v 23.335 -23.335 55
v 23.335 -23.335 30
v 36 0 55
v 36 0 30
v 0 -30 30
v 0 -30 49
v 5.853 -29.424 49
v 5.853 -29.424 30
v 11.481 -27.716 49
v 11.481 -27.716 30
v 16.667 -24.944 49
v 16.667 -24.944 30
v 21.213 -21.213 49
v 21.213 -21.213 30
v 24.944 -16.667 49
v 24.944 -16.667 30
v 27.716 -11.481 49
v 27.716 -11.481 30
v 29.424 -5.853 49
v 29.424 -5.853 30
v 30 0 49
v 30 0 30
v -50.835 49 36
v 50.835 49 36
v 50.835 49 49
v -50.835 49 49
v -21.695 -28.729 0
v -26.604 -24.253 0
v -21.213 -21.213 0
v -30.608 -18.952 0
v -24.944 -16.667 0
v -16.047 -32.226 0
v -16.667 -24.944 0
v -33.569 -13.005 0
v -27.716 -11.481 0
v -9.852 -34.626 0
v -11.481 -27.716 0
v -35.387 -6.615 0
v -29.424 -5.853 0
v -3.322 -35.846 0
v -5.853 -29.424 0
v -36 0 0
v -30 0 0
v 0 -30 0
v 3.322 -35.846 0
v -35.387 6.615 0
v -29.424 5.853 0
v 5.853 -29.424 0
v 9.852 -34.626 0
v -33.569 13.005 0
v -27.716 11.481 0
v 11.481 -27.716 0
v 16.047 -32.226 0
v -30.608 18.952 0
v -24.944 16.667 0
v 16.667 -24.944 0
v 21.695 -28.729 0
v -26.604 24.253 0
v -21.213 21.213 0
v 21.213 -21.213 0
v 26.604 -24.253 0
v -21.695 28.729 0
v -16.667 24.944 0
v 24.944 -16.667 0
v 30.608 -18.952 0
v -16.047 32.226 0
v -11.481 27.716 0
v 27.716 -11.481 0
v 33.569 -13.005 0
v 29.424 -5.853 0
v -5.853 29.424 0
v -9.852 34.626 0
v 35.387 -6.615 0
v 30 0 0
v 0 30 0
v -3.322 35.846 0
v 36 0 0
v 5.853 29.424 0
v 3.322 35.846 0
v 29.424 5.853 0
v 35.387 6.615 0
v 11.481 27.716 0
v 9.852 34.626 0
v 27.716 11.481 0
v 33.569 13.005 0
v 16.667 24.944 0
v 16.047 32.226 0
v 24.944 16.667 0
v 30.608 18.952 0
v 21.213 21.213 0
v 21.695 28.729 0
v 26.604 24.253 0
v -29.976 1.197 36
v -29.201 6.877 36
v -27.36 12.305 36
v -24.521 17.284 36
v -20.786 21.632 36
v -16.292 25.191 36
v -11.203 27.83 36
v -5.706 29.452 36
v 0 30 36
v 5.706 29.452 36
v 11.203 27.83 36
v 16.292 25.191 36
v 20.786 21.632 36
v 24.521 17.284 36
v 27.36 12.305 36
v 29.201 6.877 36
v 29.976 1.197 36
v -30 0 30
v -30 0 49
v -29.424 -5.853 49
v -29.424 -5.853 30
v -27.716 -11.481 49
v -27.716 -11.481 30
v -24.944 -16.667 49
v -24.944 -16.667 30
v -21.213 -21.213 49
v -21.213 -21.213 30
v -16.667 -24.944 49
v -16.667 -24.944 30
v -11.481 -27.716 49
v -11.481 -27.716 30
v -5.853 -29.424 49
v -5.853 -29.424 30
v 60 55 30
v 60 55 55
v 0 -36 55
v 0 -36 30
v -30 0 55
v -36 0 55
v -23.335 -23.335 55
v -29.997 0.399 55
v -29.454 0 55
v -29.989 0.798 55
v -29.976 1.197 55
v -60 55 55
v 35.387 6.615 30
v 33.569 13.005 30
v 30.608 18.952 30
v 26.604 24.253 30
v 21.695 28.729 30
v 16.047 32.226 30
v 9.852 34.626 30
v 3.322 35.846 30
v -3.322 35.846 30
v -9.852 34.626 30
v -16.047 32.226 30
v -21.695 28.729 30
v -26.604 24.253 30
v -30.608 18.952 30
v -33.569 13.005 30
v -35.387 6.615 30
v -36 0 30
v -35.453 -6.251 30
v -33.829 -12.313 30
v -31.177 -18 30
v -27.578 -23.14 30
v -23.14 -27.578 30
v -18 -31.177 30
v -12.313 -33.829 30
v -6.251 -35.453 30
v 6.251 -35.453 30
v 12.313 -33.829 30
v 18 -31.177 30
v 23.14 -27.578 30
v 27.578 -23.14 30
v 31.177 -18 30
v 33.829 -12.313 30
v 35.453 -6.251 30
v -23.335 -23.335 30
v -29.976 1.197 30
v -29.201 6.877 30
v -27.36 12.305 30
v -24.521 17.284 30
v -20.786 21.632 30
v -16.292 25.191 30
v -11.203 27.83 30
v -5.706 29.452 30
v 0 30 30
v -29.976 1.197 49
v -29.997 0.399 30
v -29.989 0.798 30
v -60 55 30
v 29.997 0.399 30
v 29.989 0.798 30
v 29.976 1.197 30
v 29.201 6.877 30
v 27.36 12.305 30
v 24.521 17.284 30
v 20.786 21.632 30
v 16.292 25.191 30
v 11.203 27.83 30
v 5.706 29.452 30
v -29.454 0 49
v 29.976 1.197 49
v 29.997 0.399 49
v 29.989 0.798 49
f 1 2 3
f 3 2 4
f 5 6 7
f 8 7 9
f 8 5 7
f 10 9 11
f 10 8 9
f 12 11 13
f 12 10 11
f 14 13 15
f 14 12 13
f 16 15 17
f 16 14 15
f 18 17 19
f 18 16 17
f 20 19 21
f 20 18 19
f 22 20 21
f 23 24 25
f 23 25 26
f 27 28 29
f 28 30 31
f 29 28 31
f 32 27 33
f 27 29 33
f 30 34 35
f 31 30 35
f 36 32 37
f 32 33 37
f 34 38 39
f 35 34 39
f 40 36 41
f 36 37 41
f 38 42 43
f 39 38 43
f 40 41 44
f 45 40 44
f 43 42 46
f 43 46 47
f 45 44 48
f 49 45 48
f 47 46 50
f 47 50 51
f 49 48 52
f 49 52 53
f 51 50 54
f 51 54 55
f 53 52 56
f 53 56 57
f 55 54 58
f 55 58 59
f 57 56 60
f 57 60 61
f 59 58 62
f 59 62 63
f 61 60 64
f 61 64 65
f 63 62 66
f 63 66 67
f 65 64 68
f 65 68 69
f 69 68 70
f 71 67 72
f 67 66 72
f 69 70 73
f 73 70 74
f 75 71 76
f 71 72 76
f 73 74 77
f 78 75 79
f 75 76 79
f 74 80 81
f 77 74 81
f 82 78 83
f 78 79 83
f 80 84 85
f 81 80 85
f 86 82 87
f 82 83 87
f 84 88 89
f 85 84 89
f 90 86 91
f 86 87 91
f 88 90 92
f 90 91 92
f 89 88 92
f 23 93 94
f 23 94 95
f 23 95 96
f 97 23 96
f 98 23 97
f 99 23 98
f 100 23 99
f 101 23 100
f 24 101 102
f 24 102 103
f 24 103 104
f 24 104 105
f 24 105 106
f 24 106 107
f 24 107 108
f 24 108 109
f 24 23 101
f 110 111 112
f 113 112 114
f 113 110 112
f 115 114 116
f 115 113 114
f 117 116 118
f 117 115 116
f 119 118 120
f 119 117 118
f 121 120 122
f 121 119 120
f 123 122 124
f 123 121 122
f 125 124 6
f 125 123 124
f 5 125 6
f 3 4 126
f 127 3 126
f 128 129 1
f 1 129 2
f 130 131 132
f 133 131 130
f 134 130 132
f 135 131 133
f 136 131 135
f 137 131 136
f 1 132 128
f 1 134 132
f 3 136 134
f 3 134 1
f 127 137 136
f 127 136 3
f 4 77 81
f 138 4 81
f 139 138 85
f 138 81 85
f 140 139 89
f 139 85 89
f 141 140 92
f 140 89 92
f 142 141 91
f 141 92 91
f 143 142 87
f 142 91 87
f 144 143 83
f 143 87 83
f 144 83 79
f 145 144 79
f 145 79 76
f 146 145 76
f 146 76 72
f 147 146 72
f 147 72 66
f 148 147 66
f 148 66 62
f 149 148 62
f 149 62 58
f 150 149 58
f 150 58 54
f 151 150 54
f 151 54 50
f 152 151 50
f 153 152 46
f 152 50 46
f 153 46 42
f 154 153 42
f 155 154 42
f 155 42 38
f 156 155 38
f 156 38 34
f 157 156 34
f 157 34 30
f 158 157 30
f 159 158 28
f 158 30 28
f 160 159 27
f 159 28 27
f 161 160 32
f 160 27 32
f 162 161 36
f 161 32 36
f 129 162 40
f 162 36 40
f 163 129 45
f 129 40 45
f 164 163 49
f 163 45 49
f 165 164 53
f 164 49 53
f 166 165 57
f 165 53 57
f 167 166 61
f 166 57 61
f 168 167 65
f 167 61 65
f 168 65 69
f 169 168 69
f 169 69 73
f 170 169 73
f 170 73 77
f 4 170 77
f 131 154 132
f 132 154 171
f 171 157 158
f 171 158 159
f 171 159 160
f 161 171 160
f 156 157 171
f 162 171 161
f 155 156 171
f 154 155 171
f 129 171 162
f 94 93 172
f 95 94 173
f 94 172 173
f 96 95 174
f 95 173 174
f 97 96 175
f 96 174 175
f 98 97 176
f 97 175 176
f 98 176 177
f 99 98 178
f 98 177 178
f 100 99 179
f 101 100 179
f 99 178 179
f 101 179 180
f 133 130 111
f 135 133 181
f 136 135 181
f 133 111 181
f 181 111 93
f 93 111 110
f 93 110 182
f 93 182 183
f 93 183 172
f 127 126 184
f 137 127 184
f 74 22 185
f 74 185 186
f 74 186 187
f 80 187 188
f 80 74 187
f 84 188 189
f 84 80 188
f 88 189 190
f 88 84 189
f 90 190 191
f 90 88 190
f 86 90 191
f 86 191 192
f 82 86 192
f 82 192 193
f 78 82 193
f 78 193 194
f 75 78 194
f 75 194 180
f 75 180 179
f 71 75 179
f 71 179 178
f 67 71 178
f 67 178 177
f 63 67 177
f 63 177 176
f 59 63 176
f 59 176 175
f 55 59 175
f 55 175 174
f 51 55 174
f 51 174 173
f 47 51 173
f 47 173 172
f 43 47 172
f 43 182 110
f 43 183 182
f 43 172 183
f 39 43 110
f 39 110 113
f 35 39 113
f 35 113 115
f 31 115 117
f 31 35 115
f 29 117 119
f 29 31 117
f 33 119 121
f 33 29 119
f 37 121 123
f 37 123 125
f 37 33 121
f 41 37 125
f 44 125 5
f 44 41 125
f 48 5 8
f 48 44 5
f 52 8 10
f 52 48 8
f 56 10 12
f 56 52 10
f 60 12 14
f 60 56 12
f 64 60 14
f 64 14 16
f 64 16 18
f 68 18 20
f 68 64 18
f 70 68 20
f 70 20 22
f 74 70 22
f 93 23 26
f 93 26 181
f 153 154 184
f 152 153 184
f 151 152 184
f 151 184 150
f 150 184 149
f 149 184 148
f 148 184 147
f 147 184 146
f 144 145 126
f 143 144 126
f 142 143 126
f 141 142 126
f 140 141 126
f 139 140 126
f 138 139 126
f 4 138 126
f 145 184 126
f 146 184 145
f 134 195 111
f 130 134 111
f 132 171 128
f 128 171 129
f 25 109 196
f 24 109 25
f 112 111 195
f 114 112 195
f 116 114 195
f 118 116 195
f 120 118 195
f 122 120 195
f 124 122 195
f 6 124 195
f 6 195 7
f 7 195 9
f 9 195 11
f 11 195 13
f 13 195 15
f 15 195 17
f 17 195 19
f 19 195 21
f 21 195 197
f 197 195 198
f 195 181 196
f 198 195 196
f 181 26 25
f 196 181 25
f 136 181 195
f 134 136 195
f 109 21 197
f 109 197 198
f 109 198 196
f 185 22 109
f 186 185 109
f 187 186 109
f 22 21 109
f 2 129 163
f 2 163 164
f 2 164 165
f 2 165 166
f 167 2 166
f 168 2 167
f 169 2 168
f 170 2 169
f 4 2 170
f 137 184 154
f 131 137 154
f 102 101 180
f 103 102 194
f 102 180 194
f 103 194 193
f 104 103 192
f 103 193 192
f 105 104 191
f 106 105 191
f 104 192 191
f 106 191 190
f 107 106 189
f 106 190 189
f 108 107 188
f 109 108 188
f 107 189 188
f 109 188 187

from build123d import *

# Parameters (mm, degrees)
F0_R     = 36
F0_R_2   = 30
F1_DEPTH = 30
F4_DEPTH = 25
F5_DEPTH = 19
F6_DEPTH = 19
F7_DEPTH = 6


with BuildPart() as f1:
    # F0 (on Top) → F1 (new body)
    with BuildSketch(Plane.XY):
        Circle(F0_R)
        Circle(F0_R_2, mode=Mode.SUBTRACT)
    extrude(amount=F1_DEPTH)

    # F3 (on offset) → F4 (join)
    with BuildSketch(Plane.XY.offset(30)):
        with BuildLine():
            Line((0, -36), (0, -30))
            ThreePointArc((0, -30), (-21.213203, -21.213203), (-30, 0))
            ThreePointArc((-30, 0), (-29.994024, 0.598773), (-29.976098, 1.197308))
            Line((-29.976098, 1.197308), (-50.835455, 49))
            Line((-50.835455, 49), (0, 49))
            Line((0, 49), (0, 55))
            Line((0, 55), (-60, 55))
            Line((-60, 55), (-36, 0))
            Line((-36, 0), (-23.334524, -23.334524))
            Line((-23.334524, -23.334524), (0, -36))
        make_face()
        with BuildLine():
            ThreePointArc((30, 0), (21.213203, -21.213203), (0, -30))
            Line((0, -30), (0, -36))
            Line((0, -36), (23.334524, -23.334524))
            Line((23.334524, -23.334524), (36, 0))
            Line((36, 0), (60, 55))
            Line((60, 55), (0, 55))
            Line((0, 55), (0, 49))
            Line((0, 49), (50.835455, 49))
            Line((50.835455, 49), (29.976098, 1.197308))
            ThreePointArc((29.976098, 1.197308), (29.994024, 0.598773), (30, 0))
        make_face()
        with BuildLine():
            ThreePointArc((-29.976098, 1.197308), (-20.785581, 21.632374), (0, 30))
            Line((0, 30), (0, 49))
            Line((0, 49), (-50.835455, 49))
            Line((-50.835455, 49), (-29.976098, 1.197308))
        make_face()
        with BuildLine():
            Line((0, 49), (0, 30))
            ThreePointArc((0, 30), (20.785581, 21.632374), (29.976098, 1.197308))
            Line((29.976098, 1.197308), (50.835455, 49))
            Line((50.835455, 49), (0, 49))
        make_face()
        with BuildLine():
            Line((0, 30), (0, 0))
            Line((0, 0), (0, -30))
            Line((0, -30), (29.453636, 0))
            Line((29.453636, 0), (29.976098, 1.197308))
            ThreePointArc((29.976098, 1.197308), (20.785581, 21.632374), (0, 30))
        make_face()
        with BuildLine():
            Line((0, -30), (0, 0))
            Line((0, 0), (0, 30))
            ThreePointArc((0, 30), (-20.785581, 21.632374), (-29.976098, 1.197308))
            Line((-29.976098, 1.197308), (-29.453636, 0))
            Line((-29.453636, 0), (0, -30))
        make_face()
        with BuildLine():
            ThreePointArc((-30, 0), (-21.213203, -21.213203), (0, -30))
            Line((0, -30), (-29.453636, 0))
            Line((-29.453636, 0), (-30, 0))
        make_face()
        with BuildLine():
            Line((29.453636, 0), (0, -30))
            ThreePointArc((0, -30), (21.213203, -21.213203), (30, 0))
            ThreePointArc((30, 0), (29.994024, 0.598773), (29.976098, 1.197308))
            Line((29.976098, 1.197308), (29.453636, 0))
        make_face()
    extrude(amount=F4_DEPTH)

    # F3 (on offset) → F5 (cut)
    with BuildSketch(Plane.XY.offset(30)):
        with BuildLine():
            ThreePointArc((-30, 0), (-21.213203, -21.213203), (0, -30))
            Line((0, -30), (-29.453636, 0))
            Line((-29.453636, 0), (-30, 0))
        make_face()
        with BuildLine():
            Line((0, -30), (0, 0))
            Line((0, 0), (0, 30))
            ThreePointArc((0, 30), (-20.785581, 21.632374), (-29.976098, 1.197308))
            Line((-29.976098, 1.197308), (-29.453636, 0))
            Line((-29.453636, 0), (0, -30))
        make_face()
        with BuildLine():
            Line((0, 30), (0, 0))
            Line((0, 0), (0, -30))
            Line((0, -30), (29.453636, 0))
            Line((29.453636, 0), (29.976098, 1.197308))
            ThreePointArc((29.976098, 1.197308), (20.785581, 21.632374), (0, 30))
        make_face()
        with BuildLine():
            Line((29.453636, 0), (0, -30))
            ThreePointArc((0, -30), (21.213203, -21.213203), (30, 0))
            ThreePointArc((30, 0), (29.994024, 0.598773), (29.976098, 1.197308))
            Line((29.976098, 1.197308), (29.453636, 0))
        make_face()
    extrude(amount=F5_DEPTH, mode=Mode.SUBTRACT)

    # F3 (on offset) → F6 (cut)
    with BuildSketch(Plane.XY.offset(30)):
        with BuildLine():
            ThreePointArc((-29.976098, 1.197308), (-20.785581, 21.632374), (0, 30))
            Line((0, 30), (0, 49))
            Line((0, 49), (-50.835455, 49))
            Line((-50.835455, 49), (-29.976098, 1.197308))
        make_face()
        with BuildLine():
            Line((0, 49), (0, 30))
            ThreePointArc((0, 30), (20.785581, 21.632374), (29.976098, 1.197308))
            Line((29.976098, 1.197308), (50.835455, 49))
            Line((50.835455, 49), (0, 49))
        make_face()
    extrude(amount=F6_DEPTH, mode=Mode.SUBTRACT)

    # F3 (on offset) → F7 (join)
    with BuildSketch(Plane.XY.offset(30)):
        with BuildLine():
            Line((0, 49), (0, 30))
            ThreePointArc((0, 30), (20.785581, 21.632374), (29.976098, 1.197308))
            Line((29.976098, 1.197308), (50.835455, 49))
            Line((50.835455, 49), (0, 49))
        make_face()
        with BuildLine():
            ThreePointArc((-29.976098, 1.197308), (-20.785581, 21.632374), (0, 30))
            Line((0, 30), (0, 49))
            Line((0, 49), (-50.835455, 49))
            Line((-50.835455, 49), (-29.976098, 1.197308))
        make_face()
    extrude(amount=F7_DEPTH)


solid = f1.part
